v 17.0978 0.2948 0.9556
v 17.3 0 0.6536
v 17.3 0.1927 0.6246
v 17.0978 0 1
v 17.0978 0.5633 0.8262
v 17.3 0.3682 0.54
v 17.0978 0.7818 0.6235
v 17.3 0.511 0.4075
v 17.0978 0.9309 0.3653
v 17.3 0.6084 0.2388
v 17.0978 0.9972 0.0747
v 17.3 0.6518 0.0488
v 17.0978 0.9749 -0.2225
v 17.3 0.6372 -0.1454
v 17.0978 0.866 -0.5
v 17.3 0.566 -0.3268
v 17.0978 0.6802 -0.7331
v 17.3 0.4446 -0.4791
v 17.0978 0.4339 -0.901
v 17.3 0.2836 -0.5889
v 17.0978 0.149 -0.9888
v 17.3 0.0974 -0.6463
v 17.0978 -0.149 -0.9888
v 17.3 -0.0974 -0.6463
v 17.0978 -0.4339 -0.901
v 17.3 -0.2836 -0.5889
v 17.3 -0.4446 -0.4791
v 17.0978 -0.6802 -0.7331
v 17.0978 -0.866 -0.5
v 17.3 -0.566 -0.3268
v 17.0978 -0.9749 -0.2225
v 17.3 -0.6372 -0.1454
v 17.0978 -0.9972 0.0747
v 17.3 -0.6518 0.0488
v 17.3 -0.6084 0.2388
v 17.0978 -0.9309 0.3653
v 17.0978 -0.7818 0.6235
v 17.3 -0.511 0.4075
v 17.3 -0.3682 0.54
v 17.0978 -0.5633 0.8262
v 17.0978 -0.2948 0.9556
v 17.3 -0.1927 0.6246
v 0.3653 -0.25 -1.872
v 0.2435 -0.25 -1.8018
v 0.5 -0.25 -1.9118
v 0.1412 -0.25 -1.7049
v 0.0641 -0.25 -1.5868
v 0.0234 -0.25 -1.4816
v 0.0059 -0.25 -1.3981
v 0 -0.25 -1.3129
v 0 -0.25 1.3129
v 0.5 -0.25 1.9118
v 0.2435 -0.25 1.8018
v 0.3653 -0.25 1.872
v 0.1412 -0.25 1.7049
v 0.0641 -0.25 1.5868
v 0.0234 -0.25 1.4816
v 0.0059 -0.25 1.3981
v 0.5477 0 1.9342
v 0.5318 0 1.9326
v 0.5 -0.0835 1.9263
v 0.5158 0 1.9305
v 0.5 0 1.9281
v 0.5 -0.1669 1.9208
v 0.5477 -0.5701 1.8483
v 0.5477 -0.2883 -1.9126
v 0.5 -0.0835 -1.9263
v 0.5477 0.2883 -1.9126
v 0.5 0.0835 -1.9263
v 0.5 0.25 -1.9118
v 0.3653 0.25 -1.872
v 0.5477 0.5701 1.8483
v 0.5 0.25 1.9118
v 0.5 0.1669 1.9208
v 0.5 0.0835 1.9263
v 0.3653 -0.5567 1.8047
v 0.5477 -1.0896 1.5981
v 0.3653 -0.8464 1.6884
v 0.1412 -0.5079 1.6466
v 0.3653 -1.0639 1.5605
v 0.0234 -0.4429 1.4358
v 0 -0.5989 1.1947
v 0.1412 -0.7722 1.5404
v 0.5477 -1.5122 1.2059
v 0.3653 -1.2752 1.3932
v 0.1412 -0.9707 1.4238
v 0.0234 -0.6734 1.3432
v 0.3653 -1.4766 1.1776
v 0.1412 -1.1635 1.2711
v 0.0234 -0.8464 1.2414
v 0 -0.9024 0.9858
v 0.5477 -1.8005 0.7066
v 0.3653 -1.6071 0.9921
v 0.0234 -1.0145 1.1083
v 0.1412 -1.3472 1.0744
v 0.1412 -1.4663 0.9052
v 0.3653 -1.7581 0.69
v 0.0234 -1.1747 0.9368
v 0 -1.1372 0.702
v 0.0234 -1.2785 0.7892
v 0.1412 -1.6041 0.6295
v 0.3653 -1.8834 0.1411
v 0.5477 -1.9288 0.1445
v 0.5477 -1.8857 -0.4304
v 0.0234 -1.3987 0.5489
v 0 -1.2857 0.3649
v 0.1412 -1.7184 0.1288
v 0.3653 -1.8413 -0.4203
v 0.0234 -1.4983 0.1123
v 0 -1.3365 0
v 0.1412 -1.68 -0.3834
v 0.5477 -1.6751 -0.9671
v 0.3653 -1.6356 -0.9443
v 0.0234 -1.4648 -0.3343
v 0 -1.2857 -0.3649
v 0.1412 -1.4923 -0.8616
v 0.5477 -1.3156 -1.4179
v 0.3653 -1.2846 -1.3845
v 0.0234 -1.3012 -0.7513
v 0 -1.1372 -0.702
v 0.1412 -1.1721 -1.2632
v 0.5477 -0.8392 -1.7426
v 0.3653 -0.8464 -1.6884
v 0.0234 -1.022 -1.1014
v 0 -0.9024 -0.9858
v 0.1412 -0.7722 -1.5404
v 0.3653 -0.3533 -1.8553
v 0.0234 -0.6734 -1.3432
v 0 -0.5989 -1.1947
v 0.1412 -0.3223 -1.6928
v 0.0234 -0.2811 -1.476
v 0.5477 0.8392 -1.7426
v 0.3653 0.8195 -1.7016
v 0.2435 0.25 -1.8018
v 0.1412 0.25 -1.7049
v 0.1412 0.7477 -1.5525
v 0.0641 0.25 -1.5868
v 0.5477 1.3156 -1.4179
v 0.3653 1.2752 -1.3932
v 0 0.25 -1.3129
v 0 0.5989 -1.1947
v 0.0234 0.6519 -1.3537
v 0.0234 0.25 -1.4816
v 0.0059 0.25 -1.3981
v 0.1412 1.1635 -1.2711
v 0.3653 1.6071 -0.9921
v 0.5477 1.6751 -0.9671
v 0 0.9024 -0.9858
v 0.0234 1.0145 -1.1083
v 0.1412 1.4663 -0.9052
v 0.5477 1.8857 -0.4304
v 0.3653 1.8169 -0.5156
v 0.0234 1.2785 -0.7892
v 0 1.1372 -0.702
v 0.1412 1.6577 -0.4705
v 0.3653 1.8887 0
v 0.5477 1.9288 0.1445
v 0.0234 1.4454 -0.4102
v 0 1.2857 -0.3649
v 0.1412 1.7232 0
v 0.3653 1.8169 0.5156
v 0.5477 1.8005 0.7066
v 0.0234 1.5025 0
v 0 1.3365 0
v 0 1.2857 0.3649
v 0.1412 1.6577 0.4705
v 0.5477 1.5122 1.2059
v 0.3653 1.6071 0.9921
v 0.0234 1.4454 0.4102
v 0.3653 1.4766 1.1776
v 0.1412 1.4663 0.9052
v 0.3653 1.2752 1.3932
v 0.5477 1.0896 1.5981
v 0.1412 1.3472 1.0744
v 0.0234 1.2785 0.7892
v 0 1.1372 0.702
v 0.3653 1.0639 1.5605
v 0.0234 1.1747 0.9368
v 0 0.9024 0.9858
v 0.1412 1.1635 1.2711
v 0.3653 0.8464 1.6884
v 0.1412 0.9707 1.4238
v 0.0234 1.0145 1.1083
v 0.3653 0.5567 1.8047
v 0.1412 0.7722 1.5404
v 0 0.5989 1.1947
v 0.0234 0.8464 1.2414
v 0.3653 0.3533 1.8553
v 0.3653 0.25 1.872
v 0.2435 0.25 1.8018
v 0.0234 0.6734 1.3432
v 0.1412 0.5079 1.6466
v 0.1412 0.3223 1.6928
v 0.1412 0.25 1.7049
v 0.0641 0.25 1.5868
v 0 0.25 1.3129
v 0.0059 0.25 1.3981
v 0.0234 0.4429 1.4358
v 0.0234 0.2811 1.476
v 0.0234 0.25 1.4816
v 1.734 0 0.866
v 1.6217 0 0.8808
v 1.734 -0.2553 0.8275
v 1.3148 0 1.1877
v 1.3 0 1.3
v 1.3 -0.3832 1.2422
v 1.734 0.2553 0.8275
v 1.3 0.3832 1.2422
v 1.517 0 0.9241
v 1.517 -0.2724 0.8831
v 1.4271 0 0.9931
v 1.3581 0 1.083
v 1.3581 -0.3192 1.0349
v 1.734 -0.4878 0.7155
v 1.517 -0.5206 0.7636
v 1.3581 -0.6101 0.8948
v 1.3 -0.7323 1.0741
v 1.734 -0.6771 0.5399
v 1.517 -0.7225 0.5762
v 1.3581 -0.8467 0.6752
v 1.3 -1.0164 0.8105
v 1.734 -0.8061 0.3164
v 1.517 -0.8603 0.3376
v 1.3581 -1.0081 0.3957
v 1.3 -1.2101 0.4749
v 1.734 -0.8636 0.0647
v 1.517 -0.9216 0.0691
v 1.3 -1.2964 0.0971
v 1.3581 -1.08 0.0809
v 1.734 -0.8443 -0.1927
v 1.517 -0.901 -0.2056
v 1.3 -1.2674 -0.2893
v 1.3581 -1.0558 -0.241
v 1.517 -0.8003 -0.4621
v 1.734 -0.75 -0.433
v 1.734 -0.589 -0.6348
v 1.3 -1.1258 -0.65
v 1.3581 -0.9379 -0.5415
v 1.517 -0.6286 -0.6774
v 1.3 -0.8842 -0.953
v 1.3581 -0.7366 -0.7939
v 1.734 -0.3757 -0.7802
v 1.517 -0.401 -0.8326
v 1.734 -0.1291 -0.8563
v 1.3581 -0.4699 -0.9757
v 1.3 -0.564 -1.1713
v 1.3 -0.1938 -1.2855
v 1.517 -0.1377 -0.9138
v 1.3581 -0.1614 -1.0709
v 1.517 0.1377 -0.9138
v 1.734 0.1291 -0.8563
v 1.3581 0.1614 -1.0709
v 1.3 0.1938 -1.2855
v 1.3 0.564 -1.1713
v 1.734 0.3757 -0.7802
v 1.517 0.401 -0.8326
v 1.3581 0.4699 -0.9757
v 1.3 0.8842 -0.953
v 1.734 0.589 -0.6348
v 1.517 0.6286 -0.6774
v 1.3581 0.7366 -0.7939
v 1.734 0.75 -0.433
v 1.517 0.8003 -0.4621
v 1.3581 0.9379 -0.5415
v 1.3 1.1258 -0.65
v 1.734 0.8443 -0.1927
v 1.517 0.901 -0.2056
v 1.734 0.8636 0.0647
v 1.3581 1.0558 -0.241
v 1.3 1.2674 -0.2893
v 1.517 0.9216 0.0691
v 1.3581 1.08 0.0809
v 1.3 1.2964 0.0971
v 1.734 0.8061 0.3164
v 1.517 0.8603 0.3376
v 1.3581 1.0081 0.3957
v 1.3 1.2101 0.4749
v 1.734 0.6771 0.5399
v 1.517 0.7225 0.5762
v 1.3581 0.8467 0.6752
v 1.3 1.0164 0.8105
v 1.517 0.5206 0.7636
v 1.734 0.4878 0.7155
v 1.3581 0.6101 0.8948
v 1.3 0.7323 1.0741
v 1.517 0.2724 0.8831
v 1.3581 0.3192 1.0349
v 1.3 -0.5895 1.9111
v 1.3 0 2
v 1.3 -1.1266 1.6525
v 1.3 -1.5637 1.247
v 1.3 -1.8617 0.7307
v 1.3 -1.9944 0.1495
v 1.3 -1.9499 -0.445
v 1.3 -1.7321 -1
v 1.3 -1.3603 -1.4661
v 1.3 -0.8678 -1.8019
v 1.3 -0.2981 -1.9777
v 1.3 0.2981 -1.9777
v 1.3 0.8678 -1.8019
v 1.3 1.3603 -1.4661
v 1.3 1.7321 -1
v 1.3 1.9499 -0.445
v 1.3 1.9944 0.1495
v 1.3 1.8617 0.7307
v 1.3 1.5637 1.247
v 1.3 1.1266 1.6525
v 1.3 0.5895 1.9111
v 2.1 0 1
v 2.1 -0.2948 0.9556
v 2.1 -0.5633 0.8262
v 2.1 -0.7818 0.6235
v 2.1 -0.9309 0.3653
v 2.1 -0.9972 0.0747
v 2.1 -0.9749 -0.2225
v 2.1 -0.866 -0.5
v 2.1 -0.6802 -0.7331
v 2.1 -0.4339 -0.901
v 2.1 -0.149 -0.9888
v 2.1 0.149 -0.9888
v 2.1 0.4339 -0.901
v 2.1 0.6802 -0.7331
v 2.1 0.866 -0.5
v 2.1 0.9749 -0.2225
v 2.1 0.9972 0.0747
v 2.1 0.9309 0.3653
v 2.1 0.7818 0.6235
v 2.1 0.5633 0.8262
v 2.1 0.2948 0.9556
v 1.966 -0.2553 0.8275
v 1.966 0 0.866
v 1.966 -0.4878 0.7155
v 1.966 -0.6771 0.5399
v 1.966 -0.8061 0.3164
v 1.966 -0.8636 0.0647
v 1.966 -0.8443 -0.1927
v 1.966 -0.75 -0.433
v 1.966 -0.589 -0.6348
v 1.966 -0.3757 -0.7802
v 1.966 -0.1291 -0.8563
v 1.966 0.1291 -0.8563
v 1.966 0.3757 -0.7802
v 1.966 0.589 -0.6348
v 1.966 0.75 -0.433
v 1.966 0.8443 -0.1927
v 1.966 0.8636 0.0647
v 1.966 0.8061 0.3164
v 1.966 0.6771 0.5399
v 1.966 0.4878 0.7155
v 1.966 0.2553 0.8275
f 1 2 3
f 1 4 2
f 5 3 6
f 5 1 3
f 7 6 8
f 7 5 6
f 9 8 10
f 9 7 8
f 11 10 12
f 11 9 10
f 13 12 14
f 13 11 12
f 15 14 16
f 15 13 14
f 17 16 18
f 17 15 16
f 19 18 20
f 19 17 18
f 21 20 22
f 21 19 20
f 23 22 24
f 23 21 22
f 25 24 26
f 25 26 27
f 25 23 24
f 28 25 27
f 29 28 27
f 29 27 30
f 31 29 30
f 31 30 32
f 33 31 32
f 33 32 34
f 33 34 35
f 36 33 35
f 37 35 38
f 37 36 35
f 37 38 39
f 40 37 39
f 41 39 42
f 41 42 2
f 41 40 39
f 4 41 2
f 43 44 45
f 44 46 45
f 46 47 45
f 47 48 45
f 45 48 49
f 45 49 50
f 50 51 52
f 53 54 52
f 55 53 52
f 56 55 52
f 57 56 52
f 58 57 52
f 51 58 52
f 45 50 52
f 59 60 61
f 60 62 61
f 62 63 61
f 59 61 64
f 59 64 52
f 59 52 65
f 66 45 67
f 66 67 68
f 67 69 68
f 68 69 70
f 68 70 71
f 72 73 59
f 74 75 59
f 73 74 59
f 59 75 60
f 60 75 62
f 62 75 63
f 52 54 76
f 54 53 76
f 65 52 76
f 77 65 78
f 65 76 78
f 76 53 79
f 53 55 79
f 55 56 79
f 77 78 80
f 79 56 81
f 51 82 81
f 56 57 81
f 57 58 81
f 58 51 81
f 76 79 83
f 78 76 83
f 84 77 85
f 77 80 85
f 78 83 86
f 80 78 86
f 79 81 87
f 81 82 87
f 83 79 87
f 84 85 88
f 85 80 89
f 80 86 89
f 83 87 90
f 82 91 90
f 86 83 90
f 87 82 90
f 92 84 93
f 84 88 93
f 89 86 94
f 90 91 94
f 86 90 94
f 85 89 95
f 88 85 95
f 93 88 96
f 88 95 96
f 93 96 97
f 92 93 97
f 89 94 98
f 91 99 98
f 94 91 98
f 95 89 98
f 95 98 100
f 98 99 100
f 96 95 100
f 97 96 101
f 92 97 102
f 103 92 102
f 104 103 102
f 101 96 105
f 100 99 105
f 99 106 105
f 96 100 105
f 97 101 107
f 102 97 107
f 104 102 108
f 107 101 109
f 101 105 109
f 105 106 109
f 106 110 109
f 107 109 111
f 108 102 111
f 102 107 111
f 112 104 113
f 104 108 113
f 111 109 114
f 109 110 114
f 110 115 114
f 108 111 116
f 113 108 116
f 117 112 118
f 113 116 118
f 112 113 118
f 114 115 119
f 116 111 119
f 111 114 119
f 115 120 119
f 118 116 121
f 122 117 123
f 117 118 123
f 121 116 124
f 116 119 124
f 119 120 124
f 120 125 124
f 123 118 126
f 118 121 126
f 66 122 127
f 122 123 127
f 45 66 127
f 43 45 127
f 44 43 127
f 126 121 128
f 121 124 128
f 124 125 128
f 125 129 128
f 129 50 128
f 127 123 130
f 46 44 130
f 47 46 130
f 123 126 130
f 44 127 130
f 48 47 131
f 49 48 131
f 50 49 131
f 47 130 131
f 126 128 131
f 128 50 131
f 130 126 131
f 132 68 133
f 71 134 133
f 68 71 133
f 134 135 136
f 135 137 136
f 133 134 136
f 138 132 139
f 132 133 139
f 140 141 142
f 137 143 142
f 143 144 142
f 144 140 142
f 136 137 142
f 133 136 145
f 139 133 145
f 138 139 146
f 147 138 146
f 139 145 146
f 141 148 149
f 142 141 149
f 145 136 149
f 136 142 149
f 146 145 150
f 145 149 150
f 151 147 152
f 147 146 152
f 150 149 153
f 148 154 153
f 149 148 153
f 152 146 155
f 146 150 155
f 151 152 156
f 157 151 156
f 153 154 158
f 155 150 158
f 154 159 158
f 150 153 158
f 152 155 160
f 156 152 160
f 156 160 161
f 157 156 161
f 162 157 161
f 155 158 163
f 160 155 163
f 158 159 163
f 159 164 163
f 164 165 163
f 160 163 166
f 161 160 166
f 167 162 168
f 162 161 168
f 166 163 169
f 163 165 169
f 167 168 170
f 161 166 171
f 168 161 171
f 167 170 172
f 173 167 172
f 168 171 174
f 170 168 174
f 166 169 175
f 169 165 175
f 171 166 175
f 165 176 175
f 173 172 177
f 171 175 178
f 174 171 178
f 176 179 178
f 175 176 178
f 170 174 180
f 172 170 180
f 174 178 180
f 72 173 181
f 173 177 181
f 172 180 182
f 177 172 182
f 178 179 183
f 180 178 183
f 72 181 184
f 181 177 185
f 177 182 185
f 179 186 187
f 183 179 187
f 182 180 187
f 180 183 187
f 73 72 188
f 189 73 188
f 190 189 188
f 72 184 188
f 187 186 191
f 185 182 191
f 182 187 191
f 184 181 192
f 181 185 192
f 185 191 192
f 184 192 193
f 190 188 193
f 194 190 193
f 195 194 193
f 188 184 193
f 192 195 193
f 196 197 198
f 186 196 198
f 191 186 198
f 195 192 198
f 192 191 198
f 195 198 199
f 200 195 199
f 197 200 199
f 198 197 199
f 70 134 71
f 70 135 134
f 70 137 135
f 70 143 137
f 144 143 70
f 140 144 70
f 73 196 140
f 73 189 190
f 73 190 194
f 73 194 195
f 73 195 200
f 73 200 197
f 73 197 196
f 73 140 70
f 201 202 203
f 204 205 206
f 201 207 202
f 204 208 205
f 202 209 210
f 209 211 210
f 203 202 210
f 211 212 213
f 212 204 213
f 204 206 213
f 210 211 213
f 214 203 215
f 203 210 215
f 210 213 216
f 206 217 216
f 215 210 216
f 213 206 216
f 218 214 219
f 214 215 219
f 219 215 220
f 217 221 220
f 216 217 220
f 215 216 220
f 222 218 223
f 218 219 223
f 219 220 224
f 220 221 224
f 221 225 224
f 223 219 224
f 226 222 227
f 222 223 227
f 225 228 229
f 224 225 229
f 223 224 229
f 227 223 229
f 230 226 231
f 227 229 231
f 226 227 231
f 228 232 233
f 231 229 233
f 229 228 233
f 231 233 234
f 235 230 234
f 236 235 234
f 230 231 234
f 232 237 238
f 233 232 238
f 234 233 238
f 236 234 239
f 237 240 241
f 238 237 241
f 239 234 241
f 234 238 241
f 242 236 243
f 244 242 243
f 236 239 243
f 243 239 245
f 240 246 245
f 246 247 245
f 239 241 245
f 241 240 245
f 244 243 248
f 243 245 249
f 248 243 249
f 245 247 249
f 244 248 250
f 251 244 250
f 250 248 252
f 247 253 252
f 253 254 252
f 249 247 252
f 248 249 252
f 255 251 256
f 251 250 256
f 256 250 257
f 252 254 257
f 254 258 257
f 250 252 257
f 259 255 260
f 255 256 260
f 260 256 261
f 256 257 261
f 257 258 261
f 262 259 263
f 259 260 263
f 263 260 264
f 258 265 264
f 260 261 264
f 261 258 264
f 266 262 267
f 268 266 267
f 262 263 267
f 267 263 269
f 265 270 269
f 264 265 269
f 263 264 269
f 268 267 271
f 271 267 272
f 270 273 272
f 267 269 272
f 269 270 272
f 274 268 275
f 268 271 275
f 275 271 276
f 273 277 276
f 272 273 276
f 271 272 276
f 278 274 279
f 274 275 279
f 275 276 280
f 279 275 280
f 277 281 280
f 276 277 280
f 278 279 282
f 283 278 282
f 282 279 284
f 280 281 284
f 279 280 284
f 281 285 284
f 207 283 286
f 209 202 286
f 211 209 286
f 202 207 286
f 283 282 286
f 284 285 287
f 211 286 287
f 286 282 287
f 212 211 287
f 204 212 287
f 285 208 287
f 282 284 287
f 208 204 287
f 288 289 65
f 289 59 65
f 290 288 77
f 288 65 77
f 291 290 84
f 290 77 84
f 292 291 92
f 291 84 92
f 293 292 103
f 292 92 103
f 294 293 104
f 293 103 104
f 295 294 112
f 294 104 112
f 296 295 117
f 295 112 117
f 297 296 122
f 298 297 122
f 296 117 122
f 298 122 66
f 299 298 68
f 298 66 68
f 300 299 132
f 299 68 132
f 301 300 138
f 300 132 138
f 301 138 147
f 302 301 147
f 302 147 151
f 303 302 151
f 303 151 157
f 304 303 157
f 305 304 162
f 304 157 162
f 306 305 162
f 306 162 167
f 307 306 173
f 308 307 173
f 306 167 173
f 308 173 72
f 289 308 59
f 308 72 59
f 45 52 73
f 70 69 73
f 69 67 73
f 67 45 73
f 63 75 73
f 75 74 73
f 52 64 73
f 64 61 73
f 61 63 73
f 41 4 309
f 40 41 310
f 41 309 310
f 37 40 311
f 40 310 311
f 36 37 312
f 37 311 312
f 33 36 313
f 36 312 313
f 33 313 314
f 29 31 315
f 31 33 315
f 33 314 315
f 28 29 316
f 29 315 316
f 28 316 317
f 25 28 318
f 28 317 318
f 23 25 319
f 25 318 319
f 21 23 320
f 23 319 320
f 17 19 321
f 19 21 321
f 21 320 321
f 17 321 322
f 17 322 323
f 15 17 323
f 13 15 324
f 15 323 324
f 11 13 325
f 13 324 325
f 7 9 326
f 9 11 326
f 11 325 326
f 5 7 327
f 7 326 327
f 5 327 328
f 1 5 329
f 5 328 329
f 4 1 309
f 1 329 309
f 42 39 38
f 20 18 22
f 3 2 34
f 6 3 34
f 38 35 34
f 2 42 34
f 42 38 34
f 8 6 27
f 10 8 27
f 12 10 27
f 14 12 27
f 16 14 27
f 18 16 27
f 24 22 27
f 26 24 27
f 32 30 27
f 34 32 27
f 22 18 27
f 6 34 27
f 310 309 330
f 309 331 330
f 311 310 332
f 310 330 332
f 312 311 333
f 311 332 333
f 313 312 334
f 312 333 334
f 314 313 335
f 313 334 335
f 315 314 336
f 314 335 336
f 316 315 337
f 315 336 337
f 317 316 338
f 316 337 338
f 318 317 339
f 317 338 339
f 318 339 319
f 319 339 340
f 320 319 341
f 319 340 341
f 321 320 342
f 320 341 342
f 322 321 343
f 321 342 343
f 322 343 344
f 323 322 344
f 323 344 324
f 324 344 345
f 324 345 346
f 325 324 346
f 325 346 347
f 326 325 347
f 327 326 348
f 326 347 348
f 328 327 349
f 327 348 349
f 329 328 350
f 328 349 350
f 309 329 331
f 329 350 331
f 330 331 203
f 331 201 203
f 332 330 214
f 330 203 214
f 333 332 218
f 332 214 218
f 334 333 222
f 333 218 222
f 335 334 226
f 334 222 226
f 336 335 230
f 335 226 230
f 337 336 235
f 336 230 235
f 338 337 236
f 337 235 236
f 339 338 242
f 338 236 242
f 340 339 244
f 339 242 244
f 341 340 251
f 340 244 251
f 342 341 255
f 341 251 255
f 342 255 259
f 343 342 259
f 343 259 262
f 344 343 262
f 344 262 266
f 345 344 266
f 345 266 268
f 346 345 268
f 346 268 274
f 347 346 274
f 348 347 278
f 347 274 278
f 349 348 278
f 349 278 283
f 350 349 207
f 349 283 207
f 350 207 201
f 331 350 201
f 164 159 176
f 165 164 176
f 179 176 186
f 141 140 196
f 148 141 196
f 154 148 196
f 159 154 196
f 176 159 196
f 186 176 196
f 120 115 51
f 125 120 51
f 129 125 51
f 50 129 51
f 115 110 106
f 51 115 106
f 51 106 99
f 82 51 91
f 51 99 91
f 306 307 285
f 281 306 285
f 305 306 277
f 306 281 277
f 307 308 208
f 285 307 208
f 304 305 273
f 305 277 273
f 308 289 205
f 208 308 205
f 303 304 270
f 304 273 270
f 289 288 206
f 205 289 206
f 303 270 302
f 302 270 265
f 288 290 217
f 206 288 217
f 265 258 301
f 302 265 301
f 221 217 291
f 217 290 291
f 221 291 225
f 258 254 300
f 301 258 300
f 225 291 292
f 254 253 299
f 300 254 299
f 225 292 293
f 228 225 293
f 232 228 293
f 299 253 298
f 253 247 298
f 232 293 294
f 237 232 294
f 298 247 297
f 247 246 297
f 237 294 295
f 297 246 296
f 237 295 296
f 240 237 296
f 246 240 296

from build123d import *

# Parameters (mm, degrees)
SKETCH_4_W          = 0.5
SKETCH_4_H          = 0.5
CUT_EXTRUDE_1_DEPTH = 50


with BuildPart() as part:
    # 草图3 → Revolve 928 (revolve)
    with BuildSketch(Plane.XY, mode=Mode.PRIVATE) as revolve_928_sk:
        with BuildLine():
            Line((0, 0), (17.3, 0))
            Line((17.3, 0), (17.3, 1))
            Line((17.3, 1), (2.1, 1))
            Line((2.1, 1), (1.966, 0.866))
            Line((1.966, 0.866), (1.734, 0.866))
            ThreePointArc((1.734, 0.866), (1.427115657, 0.993115657), (1.3, 1.3))
            Line((1.3, 1.3), (1.3, 2))
            Line((1.3, 2), (0.547706554, 1.934182852))
            ThreePointArc((0.547706554, 1.934182852), (0.157633598, 1.741820158), (0, 1.336466033))
            Line((0, 1.336466033), (0, 0))
        make_face()
    revolve(revolve_928_sk.sketch.rotate(Axis((-2.477021524, 0, 0), (1, 0, 0)), 90), axis=Axis((-2.477021524, 0, 0), (1, 0, 0)))

    # 草图4 → 切除-拉伸1 (cut, symmetric)
    with BuildSketch(Plane.XY):
        with Locations((0.25, 0)):
            Rectangle(SKETCH_4_W, SKETCH_4_H)
    extrude(amount=CUT_EXTRUDE_1_DEPTH, both=True, mode=Mode.SUBTRACT)

    # 草图5 → 切除-旋转1 (revolve, cut)
    with BuildSketch(Plane.XY, mode=Mode.PRIVATE) as cut_revolve_1_sk:
        Polygon((17.097833598, 1), (17.497833598, 1), (17.3, 0.6536), align=None)
    revolve(cut_revolve_1_sk.sketch.rotate(Axis((6.174994867, 0, 0), (-1, 0, 0)), 270), axis=Axis((6.174994867, 0, 0), (-1, 0, 0)), mode=Mode.SUBTRACT)


solid = part.part
